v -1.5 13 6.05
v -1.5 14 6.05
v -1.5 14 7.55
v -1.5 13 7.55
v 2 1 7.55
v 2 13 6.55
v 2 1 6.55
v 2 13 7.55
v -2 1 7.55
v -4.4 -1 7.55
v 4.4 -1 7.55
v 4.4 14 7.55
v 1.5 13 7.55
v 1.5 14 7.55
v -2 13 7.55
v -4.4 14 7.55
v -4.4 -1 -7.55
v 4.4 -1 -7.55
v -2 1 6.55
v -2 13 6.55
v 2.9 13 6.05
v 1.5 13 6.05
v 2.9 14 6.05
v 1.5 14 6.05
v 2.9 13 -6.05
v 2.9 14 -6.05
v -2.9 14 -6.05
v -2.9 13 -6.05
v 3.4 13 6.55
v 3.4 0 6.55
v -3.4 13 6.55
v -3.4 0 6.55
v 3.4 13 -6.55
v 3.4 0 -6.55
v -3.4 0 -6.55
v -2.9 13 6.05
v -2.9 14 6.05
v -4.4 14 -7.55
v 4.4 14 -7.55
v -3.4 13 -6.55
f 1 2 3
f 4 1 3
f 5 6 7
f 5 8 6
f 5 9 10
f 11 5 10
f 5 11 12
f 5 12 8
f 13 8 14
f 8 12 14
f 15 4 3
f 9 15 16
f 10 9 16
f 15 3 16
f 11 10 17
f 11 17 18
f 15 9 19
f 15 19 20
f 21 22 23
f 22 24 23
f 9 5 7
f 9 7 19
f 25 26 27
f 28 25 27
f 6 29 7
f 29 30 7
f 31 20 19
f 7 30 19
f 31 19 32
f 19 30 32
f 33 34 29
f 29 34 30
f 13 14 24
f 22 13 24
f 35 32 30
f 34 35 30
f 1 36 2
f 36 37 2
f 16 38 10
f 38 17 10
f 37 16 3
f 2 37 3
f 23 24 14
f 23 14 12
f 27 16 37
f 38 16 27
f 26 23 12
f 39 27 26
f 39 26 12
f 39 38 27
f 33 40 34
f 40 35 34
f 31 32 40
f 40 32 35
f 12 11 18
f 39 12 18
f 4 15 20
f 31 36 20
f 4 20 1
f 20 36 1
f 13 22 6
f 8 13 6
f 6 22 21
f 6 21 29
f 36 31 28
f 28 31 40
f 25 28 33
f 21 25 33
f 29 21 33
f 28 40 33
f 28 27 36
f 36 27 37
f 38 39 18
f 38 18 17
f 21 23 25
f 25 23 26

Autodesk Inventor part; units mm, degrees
ref_plane "YZ Plane" through (0, 0, 0) normal (1, 0, 0) x (0, 1, 0)
ref_plane "XZ Plane" through (0, 0, 0) normal (0, 1, 0) x (-1, 0, 0)
ref_plane "XY Plane" through (0, 0, 0) normal (0, 0, 1) x (1, 0, 0)
sketch "Sketch1" plane through (0, 0, 0) normal (0, 1, 0) x (-1, 0, 0)
  line L0 (-3.4, 6.55) -> (3.4, 6.55)
  line L1 (3.4, 6.55) -> (3.4, -6.55)
  line L2 (3.4, -6.55) -> (-3.4, -6.55)
  line L3 (-3.4, -6.55) -> (-3.4, 6.55)
  line L4 (-3.4, 6.55) -> (3.4, -6.55) construction
  line L5 (3.4, 6.55) -> (-3.4, -6.55) construction
  line L6 (4.4, -7.55) -> (4.4, 7.55)
  line L7 (4.4, 7.55) -> (-4.4, 7.55)
  line L8 (-4.4, 7.55) -> (-4.4, -7.55)
  line L9 (-4.4, -7.55) -> (4.4, -7.55)
  point P0 (0, 0)
  dimension "d0" = 6.8
  dimension "d1" = 13.1
  dimension "d2" = 1
extrude "Extrusion1" add sketch "Sketch1" along normal blind 14
sketch "Sketch3" plane through (0, 0, 0) normal (0, -1, 0) x (1, 0, 0)
  line L0 (-4.4, 7.55) -> (4.4, 7.55) projected
  line L1 (-4.4, -7.55) -> (-4.4, 7.55) projected
  line L2 (4.4, -7.55) -> (-4.4, -7.55) projected
  line L3 (4.4, 7.55) -> (4.4, -7.55) projected
  line L4 (-3.4, -6.55) -> (3.4, -6.55) projected
  line L5 (-3.4, 6.55) -> (-3.4, -6.55) projected
  line L6 (3.4, 6.55) -> (-3.4, 6.55) projected
  line L7 (3.4, -6.55) -> (3.4, 6.55) projected
  point P0 (0, 0)
extrude "Extrusion2" add sketch "Sketch3" along normal blind 1 contours L0 L3 L2 L1 | L5 L6 L7 L4
sketch "Sketch4" plane through (-4.4, 14, 7.55) normal (0, 0, 1) x (1, 0, 0)
  line L0 (0, 0) -> (8.8, 0) projected
  line L1 (2.4, 0) -> (6.4, 0)
  line L2 (6.4, 0) -> (6.4, -13)
  line L3 (6.4, -13) -> (2.4, -13)
  line L4 (2.4, -13) -> (2.4, 0)
  point P0 (4.4, -14)
  point P1 (4.4, 0)
  point P2 (4.4, 0)
  point P3 (6.4, 0)
  dimension "d7" = 1
  dimension "d8" = 4
extrude "Extrusion3" cut sketch "Sketch4" against normal up to surface (1 mm away)
sketch "Sketch5" plane through (0, 14, 0) normal (0, 1, 0) x (1, 0, 0)
  line L0 (2, -6.55) -> (2, -7.55) projected
  line L1 (2, -7.55) -> (4.4, -7.55) projected
  line L2 (4.4, -7.55) -> (4.4, 7.55) projected
  line L3 (4.4, 7.55) -> (-4.4, 7.55) projected
  line L4 (-4.4, 7.55) -> (-4.4, -7.55) projected
  line L5 (-4.4, -7.55) -> (-2, -7.55) projected
  line L6 (-2, -7.55) -> (-2, -6.55) projected
  line L7 (-2, -6.55) -> (-3.4, -6.55) projected
  line L8 (-3.4, -6.55) -> (-3.4, 6.55) projected
  line L9 (-3.4, 6.55) -> (3.4, 6.55) projected
  line L10 (3.4, 6.55) -> (3.4, -6.55) projected
  line L11 (3.4, -6.55) -> (2, -6.55) projected
  line L12 (-2.9, 6.05) -> (-2.9, -6.05)
  line L13 (-2.9, -6.05) -> (-1.5, -6.05)
  line L14 (-1.5, -6.05) -> (-1.5, -8.05)
  line L15 (-1.5, -8.05) -> (-4.9, -8.05)
  line L16 (-4.9, -8.05) -> (-4.9, 8.05)
  line L17 (-4.9, 8.05) -> (4.9, 8.05)
  line L18 (4.9, 8.05) -> (4.9, -8.05)
  line L19 (4.9, -8.05) -> (1.5, -8.05)
  line L20 (1.5, -8.05) -> (1.5, -6.05)
  line L21 (1.5, -6.05) -> (2.9, -6.05)
  line L22 (2.9, -6.05) -> (2.9, 6.05)
  line L23 (2.9, 6.05) -> (-2.9, 6.05)
  line L24 (-4.4, -7.55) -> (-2, -7.55) projected
  line L25 (-2, -7.55) -> (-1.5, -7.55)
  line L26 (4.4, -7.55) -> (-4.4, -7.55) projected
  line L27 (2, -7.55) -> (2, -6.55) projected
  line L28 (2, -7.55) -> (1.5, -7.55)
  point P0 (0, 0)
  point P1 (1.5, -7.55)
  dimension "d11" = 0.5
extrude "Extrusion4" add sketch "Sketch5" against normal blind 1 contours L0 L26 L20 L21 L22 L23 L12 L13 L14 L25 L6 L7 L8 L9 L10 L11
properties part number "SwitchHolder" material "Thermoplastic Resin"
